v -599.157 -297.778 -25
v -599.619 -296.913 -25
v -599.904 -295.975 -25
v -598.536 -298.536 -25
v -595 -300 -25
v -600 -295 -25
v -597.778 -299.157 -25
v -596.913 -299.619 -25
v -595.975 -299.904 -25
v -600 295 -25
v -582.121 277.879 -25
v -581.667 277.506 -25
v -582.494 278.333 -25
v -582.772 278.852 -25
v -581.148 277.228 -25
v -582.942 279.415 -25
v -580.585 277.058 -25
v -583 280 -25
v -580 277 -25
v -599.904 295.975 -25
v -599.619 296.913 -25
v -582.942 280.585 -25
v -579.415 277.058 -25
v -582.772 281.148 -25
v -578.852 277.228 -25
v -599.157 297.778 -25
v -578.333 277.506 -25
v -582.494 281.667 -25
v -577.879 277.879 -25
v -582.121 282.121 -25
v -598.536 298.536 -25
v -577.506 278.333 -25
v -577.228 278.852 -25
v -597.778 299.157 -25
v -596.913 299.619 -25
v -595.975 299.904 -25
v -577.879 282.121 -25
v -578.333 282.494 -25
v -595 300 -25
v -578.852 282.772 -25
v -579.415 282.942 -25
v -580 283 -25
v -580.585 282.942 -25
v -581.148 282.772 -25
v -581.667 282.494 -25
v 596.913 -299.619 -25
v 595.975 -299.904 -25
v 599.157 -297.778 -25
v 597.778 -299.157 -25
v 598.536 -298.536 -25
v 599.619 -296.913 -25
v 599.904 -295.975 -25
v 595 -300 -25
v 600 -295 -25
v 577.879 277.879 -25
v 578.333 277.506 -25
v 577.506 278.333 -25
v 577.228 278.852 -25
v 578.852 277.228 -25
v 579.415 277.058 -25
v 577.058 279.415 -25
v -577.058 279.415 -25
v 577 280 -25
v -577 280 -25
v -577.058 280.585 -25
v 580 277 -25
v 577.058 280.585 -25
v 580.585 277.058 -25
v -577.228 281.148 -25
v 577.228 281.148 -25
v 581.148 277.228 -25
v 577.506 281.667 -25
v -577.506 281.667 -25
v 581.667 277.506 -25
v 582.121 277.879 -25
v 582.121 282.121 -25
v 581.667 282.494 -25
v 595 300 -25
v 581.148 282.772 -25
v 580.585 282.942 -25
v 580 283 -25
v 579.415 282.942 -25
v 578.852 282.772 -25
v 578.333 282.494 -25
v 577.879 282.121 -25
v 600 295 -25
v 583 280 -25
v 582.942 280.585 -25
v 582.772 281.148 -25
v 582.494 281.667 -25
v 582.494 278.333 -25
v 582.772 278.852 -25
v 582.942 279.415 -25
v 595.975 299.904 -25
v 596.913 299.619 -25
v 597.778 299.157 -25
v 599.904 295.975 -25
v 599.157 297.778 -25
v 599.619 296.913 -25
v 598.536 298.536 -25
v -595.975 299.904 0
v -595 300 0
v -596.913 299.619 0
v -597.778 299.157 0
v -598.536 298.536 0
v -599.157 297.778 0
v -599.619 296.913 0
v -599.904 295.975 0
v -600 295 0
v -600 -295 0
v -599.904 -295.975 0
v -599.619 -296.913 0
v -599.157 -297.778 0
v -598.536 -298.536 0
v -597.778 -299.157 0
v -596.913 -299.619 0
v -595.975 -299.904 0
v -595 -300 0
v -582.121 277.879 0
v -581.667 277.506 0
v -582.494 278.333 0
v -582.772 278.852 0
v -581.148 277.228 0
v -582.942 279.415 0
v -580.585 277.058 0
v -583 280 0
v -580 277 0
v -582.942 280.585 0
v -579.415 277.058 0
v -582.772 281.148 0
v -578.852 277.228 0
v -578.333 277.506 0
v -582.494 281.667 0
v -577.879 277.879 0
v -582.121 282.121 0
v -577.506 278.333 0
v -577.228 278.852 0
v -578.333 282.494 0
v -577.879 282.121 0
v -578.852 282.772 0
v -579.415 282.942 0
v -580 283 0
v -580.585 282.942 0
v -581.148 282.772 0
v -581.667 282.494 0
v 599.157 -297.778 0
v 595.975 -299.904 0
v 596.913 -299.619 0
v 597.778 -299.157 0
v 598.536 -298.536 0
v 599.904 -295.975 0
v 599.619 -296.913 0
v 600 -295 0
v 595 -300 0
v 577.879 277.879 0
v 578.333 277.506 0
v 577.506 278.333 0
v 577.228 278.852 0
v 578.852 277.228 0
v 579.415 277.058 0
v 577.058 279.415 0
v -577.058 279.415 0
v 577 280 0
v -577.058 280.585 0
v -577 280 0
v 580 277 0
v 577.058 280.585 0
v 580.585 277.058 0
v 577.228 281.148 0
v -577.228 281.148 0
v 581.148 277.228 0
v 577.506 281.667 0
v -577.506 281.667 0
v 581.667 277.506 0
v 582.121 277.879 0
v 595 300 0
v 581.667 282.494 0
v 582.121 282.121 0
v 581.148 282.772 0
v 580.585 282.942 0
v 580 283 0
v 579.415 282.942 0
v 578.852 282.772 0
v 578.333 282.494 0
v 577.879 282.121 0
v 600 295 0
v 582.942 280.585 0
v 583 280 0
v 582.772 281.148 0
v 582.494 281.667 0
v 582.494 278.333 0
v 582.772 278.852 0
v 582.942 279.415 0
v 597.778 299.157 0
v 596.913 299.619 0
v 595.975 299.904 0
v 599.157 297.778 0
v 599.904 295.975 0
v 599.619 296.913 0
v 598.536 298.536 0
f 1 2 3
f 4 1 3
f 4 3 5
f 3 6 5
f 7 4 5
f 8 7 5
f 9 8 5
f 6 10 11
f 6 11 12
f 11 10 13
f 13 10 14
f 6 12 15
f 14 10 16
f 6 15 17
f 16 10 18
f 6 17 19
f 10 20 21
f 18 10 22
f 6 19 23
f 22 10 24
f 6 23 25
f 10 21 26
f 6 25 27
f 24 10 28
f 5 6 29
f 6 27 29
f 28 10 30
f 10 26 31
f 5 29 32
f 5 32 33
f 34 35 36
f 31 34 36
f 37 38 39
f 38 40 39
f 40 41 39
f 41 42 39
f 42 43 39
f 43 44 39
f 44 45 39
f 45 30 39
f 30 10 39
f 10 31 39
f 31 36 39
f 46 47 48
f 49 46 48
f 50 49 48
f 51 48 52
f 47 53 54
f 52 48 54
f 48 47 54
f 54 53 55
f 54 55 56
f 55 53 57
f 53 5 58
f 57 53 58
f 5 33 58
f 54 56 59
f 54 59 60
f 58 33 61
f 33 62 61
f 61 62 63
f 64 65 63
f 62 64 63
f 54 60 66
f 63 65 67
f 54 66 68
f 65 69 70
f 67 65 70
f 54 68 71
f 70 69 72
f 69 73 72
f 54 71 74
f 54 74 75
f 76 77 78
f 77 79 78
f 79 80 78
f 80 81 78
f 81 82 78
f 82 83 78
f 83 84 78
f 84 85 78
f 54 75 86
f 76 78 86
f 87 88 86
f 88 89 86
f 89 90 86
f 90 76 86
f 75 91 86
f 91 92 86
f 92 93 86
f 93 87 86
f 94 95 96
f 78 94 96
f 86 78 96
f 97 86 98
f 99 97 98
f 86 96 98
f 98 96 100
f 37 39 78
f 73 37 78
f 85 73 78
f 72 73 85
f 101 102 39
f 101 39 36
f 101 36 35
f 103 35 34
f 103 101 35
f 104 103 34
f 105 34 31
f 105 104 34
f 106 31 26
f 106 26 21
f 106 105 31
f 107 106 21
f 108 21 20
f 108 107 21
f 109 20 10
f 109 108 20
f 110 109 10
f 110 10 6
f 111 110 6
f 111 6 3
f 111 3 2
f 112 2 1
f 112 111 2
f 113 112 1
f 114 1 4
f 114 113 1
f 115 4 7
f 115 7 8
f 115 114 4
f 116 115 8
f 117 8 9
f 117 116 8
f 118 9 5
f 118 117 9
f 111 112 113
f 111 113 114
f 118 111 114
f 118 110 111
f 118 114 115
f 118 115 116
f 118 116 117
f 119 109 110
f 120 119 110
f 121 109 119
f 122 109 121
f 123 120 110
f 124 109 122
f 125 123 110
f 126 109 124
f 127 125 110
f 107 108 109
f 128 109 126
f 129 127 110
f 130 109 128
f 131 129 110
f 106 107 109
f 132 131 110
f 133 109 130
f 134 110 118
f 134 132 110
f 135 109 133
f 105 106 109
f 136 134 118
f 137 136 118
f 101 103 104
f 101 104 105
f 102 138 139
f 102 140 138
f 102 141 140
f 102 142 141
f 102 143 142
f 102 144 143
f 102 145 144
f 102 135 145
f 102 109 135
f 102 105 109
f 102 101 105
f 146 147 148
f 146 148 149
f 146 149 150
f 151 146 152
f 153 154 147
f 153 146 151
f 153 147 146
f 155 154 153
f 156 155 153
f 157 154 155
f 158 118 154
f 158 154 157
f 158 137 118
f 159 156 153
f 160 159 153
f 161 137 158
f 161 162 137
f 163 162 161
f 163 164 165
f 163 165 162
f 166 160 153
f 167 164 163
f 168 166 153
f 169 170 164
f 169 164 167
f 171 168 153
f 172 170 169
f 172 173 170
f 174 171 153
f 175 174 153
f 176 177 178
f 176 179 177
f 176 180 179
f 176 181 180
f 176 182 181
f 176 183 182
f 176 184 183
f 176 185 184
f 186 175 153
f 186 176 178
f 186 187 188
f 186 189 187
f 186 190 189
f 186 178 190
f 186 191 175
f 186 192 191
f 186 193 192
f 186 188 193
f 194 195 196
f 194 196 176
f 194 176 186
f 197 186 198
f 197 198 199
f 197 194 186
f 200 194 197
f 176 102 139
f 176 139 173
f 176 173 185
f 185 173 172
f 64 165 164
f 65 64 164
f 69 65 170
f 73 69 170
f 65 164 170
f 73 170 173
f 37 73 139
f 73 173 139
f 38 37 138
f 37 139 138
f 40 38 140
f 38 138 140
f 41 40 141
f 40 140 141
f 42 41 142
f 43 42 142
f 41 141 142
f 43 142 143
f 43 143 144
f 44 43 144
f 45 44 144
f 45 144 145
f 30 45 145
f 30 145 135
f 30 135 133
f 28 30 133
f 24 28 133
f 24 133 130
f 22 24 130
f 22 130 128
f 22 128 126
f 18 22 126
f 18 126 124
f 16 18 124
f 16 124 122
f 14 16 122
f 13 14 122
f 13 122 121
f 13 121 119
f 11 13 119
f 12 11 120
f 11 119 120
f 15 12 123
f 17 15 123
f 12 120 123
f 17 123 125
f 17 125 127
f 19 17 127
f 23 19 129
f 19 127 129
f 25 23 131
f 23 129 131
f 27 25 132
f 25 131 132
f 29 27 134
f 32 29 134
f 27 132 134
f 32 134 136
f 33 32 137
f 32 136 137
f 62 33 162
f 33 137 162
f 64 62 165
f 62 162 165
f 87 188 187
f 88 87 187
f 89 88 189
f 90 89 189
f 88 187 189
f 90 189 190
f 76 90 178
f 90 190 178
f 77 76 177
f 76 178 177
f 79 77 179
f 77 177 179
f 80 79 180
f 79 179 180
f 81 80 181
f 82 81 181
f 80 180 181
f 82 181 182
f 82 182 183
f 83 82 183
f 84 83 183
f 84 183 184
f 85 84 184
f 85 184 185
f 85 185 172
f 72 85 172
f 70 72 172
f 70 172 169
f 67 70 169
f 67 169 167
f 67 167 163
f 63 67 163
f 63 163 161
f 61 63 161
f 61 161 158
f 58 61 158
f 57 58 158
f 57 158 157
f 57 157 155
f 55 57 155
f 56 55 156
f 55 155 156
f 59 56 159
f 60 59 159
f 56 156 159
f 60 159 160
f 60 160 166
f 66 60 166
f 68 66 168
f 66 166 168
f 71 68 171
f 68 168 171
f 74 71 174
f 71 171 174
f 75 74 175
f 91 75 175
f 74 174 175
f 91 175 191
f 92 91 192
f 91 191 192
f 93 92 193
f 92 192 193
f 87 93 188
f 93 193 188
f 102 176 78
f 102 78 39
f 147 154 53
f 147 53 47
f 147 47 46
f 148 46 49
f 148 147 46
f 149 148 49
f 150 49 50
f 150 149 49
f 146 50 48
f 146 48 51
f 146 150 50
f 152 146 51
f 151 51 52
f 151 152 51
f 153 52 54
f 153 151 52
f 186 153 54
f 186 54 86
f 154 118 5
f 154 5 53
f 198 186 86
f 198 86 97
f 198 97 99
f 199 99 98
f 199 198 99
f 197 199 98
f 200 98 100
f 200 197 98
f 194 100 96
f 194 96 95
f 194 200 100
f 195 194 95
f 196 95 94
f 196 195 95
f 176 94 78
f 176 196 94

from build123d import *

# Parameters (mm, degrees)
BOSS_EXTRUDE1_DEPTH = 25
SKETCH2_R           = 3
CUT_EXTRUDE1_DEPTH  = 27.5


with BuildPart() as part:
    # Sketch1 → Boss-Extrude1 (new body)
    with BuildSketch(Plane.XY):
        with BuildLine():
            Line((-595, -300), (595, -300))
            ThreePointArc((595, -300), (598.535533906, -298.535533906), (600, -295))
            Line((600, -295), (600, 295))
            ThreePointArc((600, 295), (598.535533906, 298.535533906), (595, 300))
            Line((595, 300), (-595, 300))
            ThreePointArc((-595, 300), (-598.535533906, 298.535533906), (-600, 295))
            Line((-600, 295), (-600, -295))
            ThreePointArc((-600, -295), (-598.535533906, -298.535533906), (-595, -300))
        make_face()
    extrude(amount=-BOSS_EXTRUDE1_DEPTH)

    # Sketch2 → Cut-Extrude1 (cut)
    with BuildSketch(Plane.XY):
        with Locations((580, 280)):
            Circle(SKETCH2_R)
        with Locations((-580, 280)):
            Circle(SKETCH2_R)
    extrude(amount=-CUT_EXTRUDE1_DEPTH, mode=Mode.SUBTRACT)


solid = part.part
